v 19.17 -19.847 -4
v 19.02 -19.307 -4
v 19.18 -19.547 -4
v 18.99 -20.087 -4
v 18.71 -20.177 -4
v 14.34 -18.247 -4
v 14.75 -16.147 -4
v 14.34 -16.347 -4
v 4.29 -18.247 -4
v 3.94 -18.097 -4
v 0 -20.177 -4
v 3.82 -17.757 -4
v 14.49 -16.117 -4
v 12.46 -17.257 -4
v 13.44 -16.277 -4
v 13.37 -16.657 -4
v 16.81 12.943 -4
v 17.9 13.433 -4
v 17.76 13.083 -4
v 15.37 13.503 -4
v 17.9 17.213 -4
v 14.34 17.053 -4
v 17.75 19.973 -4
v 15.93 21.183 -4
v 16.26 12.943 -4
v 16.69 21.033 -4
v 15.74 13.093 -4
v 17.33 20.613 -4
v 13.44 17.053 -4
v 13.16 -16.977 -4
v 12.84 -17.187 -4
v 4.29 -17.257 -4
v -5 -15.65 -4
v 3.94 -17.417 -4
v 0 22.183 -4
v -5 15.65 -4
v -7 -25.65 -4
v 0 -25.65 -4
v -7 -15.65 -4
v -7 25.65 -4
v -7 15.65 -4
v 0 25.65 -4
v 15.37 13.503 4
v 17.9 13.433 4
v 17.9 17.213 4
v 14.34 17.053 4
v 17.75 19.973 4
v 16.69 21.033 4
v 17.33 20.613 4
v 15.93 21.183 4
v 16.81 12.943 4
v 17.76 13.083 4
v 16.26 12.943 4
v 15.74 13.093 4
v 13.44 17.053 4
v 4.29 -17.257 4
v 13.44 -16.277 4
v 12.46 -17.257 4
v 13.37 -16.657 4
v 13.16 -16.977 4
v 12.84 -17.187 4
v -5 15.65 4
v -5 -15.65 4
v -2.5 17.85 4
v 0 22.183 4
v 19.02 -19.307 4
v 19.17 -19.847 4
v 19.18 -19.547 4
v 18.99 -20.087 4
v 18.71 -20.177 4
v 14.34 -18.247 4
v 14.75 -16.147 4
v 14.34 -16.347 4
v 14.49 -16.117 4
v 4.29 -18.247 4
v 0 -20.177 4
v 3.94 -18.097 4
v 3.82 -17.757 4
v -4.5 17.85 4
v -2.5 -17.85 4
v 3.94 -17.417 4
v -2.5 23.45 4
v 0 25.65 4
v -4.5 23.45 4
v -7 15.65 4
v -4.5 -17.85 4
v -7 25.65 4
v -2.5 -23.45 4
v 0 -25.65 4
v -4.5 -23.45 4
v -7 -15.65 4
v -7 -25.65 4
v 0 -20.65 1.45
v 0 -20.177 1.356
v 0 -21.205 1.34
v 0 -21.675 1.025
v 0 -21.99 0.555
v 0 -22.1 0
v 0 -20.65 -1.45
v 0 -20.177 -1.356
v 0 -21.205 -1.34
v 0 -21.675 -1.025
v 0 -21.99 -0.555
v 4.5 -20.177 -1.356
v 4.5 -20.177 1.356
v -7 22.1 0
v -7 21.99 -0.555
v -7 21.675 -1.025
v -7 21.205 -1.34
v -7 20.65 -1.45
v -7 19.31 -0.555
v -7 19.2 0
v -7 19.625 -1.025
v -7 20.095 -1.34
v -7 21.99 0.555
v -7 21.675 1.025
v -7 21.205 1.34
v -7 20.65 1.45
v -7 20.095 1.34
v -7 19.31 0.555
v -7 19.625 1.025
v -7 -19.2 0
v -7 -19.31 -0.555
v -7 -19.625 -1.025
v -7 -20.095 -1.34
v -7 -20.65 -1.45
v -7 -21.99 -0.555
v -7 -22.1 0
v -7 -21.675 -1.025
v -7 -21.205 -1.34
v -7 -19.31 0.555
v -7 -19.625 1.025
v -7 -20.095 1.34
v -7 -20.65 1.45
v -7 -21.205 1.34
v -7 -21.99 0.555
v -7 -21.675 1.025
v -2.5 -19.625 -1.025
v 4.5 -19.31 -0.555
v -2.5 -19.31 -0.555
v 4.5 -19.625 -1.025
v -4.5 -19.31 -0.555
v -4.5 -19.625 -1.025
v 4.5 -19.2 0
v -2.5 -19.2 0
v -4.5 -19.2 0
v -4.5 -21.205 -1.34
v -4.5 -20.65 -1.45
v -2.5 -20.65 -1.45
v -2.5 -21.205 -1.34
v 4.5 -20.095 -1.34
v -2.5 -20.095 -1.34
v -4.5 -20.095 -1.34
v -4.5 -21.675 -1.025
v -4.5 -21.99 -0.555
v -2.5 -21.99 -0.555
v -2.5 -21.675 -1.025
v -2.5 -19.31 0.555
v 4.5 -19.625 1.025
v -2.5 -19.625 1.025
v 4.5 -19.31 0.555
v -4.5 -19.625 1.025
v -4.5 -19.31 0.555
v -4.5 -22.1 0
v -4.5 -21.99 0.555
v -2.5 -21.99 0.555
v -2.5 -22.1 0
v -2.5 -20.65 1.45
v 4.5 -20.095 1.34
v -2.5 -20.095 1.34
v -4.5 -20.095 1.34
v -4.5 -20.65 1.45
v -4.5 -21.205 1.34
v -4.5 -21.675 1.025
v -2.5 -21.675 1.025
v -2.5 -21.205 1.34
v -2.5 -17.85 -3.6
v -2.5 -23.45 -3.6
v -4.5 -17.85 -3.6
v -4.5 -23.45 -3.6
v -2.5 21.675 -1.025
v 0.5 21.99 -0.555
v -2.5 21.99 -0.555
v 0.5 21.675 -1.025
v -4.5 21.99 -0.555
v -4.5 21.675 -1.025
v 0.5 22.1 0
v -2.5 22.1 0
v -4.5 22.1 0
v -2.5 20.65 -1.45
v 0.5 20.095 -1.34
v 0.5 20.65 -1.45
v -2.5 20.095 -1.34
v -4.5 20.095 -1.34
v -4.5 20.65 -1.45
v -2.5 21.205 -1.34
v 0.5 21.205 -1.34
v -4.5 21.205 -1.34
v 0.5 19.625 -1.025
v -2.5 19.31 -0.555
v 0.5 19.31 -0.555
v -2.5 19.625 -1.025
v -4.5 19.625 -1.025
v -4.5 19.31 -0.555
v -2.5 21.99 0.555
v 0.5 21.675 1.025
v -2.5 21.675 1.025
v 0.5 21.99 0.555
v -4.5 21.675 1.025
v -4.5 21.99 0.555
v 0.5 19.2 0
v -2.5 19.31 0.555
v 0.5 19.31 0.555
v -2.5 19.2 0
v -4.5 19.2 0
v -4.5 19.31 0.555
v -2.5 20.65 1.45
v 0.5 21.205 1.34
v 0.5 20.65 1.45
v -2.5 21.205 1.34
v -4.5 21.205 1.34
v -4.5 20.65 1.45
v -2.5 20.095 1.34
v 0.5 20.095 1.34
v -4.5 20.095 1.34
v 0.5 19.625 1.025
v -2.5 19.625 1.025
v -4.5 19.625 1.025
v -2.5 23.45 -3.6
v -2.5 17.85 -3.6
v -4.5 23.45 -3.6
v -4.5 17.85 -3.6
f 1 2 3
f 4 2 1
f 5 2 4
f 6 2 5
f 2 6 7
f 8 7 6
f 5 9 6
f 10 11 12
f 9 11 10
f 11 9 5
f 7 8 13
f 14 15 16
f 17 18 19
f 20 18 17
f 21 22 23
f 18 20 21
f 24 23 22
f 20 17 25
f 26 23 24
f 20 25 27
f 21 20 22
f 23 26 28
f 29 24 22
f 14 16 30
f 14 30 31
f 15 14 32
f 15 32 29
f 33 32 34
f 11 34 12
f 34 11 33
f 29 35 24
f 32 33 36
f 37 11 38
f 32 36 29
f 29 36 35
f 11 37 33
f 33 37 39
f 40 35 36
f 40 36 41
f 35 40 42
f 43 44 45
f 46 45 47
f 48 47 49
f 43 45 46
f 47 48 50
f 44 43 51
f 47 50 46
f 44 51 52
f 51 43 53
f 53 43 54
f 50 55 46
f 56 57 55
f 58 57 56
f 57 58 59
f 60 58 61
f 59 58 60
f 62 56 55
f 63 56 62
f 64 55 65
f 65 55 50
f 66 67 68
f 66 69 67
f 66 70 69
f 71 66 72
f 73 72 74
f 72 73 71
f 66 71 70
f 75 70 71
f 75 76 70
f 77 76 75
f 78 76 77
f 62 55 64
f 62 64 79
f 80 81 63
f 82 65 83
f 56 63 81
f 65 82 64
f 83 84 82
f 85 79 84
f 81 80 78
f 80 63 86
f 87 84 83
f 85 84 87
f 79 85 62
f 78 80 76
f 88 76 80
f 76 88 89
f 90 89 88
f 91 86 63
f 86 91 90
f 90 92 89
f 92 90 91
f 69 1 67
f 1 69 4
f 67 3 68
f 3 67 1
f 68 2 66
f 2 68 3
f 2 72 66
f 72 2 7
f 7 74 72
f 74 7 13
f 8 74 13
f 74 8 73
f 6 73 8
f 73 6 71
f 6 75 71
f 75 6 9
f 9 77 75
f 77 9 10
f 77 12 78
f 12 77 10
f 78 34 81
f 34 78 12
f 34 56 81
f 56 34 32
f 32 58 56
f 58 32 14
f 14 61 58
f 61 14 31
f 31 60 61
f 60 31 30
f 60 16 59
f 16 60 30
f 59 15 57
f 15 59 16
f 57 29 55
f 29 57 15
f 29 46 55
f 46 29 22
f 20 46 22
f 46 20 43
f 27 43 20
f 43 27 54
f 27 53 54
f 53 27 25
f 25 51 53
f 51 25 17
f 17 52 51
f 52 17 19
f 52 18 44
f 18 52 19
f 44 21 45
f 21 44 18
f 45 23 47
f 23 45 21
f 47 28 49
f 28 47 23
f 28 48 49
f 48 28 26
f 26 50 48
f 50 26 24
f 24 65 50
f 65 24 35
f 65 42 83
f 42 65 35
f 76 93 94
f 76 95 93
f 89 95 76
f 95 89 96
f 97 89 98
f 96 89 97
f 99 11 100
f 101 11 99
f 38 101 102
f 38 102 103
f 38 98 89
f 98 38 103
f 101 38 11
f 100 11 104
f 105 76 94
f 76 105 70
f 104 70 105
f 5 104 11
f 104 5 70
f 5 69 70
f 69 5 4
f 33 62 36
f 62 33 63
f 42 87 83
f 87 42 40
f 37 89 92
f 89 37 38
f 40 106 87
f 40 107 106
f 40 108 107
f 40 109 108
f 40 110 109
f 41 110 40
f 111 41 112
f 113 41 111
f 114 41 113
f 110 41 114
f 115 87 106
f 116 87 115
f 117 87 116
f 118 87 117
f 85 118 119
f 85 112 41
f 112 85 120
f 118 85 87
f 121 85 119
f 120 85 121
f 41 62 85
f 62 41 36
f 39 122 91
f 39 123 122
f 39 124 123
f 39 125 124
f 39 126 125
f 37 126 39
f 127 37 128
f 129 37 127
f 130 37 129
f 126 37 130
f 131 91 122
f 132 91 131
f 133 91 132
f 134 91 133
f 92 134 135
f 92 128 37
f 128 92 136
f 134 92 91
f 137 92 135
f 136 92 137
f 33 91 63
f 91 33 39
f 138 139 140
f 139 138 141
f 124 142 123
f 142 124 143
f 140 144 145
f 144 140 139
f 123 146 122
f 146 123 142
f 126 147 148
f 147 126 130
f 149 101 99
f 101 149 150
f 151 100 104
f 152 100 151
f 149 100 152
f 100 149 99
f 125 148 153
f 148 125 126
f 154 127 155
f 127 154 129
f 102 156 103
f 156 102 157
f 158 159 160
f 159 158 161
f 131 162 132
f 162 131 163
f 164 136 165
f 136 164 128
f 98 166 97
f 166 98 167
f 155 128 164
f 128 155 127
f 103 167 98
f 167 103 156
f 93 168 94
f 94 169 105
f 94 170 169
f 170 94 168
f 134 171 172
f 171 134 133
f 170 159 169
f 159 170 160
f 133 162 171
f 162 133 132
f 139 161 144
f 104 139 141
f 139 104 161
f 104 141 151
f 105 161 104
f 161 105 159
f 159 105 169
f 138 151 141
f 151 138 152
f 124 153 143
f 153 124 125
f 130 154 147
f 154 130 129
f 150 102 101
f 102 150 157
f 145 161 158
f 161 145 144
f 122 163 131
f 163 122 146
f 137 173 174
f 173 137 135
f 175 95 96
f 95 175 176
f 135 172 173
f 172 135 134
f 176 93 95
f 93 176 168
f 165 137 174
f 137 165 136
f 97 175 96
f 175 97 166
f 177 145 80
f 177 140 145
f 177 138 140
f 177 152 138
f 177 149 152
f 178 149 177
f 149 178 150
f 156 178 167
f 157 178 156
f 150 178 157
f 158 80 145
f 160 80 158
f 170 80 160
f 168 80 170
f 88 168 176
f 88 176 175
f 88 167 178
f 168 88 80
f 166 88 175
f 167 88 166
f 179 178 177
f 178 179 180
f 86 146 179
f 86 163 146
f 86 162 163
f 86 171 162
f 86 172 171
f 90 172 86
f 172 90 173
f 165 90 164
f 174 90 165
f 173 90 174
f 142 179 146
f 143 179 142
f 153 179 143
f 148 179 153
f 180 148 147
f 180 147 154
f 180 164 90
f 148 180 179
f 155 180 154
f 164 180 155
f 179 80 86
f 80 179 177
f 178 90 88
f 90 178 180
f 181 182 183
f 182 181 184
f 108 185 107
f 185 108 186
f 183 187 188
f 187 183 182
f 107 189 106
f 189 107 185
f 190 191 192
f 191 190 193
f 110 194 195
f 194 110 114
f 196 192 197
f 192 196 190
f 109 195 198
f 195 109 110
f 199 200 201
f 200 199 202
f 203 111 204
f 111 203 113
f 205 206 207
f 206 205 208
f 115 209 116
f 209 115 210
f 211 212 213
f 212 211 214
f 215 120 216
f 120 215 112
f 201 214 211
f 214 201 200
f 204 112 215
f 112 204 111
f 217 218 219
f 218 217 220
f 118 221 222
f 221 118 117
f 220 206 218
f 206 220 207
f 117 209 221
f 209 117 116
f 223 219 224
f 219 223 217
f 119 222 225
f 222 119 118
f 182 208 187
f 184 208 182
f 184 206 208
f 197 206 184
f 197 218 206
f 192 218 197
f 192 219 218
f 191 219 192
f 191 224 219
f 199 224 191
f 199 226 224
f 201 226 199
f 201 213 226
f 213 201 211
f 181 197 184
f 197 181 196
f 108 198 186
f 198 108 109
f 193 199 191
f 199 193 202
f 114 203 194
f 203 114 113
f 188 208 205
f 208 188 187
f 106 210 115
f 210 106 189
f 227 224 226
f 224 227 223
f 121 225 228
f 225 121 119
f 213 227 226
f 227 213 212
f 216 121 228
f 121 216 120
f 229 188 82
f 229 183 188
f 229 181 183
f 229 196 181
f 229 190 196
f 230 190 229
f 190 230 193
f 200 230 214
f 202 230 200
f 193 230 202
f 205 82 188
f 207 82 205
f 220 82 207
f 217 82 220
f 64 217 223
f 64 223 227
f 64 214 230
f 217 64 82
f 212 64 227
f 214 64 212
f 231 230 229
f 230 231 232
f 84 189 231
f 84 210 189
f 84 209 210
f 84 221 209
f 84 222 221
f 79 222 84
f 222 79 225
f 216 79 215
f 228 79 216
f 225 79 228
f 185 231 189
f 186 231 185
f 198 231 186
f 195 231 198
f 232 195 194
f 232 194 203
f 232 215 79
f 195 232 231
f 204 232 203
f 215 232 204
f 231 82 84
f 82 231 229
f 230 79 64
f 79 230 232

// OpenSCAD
// Remix of http://www.thingiverse.com/thing:806093

//Clip thickness
CLIP_H = 8;
// Holes diameter
HOLE_DIAMETER = 2.9;
// Distance between the 2 holes
//PILLAR_PITCH = 62.23;
//PILLAR_PITCH = 45.00;  // teensy led driver board
PILLAR_PITCH = 41.30;  // teensy wifi pcb


// Height of the mounting bar
MOUNT_H = 5;
// Height of pillars
PILLAR_H = 2;

PILLAR_1_Y_OFFSET = PILLAR_PITCH/2;
PILLAR_2_Y_OFFSET = -PILLAR_PITCH/2;

bolt_hole = [2,5.6,8];

module shape()
{
    p = [
    [9.40,21.09], // back top of flex clip nose
    [9.58,20.85],
    [9.59,20.55],
    [9.43,20.31],

    [5.76-.6,17.15], // nose of flex clip
    [5.50-.6,17.12],
    [5.35-.6,17.35],
    [5.35-.6,19.25],

    [-5.30,19.25], // dip of flex clip
    [-5.65,19.10],
    [-5.77,18.76],
    [-5.65,18.42],
    [-5.30,18.26],

    [2.87,18.26], // inside of flex clip
    [3.25,18.19],
    [3.57,17.98],
    [3.78,17.66],
    [3.85,17.28],

    [3.85,-16.05], //inside back for solid clip
    [5.35-.6,-16.05],

    [6.38-.6,-12.50], //nose of solid clip
    [6.75-.6,-12.09],
    [7.27-.6,-11.94],
    [7.82-.6,-11.94],

    [8.17,-12.08],

    [8.31,-12.43],
    
    [8.31,-16.21],
    [8.16,-18.97],
    [7.74,-19.61],
    [7.10,-20.03],
    [6.34,-20.18],
    [-9.59,-21.18],
    [-9.59,21.18],
    [9.12,21.18]];
    
    xm = min([ for (x=p) x[0] ]);
    ym = min([ for (x=p) x[1] ]); 
    echo([xm, ym]);
    translate([0,22.183,0]) // This offset is know by displaying 
                            // DXF file a CAD software
        rotate([180,0,0])
            translate([-xm, -ym])
                polygon(p);
}

module din_clip() {

	difference() {
		
	union() {
            linear_extrude(height=CLIP_H, center=true, convexity=5) {
                //import(file="PCB_din_clip.dxf", $fn=64);
		shape();
            }
		      
            translate([-MOUNT_H/2, 0, 0]) {
                cube([MOUNT_H,PILLAR_PITCH+10,CLIP_H], center=true);
            }
            
            translate([-PILLAR_H/2-MOUNT_H, PILLAR_1_Y_OFFSET, 0]) {
				rotate([0, 0, 0]) {
					cube([PILLAR_H,10,CLIP_H], center = true);
				}
            }

            translate([-PILLAR_H/2-MOUNT_H, PILLAR_2_Y_OFFSET, 0]) {
				rotate([0, 0, 0]) {
					cube([PILLAR_H,10,CLIP_H], center = true);
				}
            }
	}

	union() {
		translate([-PILLAR_H-MOUNT_H-0.5, PILLAR_2_Y_OFFSET, 0]) {
			rotate([0, 90, 0]) {
				cylinder(h= PILLAR_H+MOUNT_H+5, r = HOLE_DIAMETER / 2, $fn = 16);
			}
		}
		translate([-PILLAR_H-MOUNT_H+2.5, PILLAR_2_Y_OFFSET-bolt_hole.y/2, -(bolt_hole.z-4.4)]) {
			cube(bolt_hole);
		}

		translate([-PILLAR_H-MOUNT_H-0.5, PILLAR_1_Y_OFFSET, 0]) {
			rotate([0, 90, 0]) {
				cylinder(h= PILLAR_H+MOUNT_H+1, r = HOLE_DIAMETER / 2, $fn = 16);
			}
		}
		translate([-PILLAR_H-MOUNT_H+2.5, PILLAR_1_Y_OFFSET-bolt_hole.y/2, -(bolt_hole.z-4.4)]) {
			cube(bolt_hole);
		}
	}
    }
}

din_clip();
